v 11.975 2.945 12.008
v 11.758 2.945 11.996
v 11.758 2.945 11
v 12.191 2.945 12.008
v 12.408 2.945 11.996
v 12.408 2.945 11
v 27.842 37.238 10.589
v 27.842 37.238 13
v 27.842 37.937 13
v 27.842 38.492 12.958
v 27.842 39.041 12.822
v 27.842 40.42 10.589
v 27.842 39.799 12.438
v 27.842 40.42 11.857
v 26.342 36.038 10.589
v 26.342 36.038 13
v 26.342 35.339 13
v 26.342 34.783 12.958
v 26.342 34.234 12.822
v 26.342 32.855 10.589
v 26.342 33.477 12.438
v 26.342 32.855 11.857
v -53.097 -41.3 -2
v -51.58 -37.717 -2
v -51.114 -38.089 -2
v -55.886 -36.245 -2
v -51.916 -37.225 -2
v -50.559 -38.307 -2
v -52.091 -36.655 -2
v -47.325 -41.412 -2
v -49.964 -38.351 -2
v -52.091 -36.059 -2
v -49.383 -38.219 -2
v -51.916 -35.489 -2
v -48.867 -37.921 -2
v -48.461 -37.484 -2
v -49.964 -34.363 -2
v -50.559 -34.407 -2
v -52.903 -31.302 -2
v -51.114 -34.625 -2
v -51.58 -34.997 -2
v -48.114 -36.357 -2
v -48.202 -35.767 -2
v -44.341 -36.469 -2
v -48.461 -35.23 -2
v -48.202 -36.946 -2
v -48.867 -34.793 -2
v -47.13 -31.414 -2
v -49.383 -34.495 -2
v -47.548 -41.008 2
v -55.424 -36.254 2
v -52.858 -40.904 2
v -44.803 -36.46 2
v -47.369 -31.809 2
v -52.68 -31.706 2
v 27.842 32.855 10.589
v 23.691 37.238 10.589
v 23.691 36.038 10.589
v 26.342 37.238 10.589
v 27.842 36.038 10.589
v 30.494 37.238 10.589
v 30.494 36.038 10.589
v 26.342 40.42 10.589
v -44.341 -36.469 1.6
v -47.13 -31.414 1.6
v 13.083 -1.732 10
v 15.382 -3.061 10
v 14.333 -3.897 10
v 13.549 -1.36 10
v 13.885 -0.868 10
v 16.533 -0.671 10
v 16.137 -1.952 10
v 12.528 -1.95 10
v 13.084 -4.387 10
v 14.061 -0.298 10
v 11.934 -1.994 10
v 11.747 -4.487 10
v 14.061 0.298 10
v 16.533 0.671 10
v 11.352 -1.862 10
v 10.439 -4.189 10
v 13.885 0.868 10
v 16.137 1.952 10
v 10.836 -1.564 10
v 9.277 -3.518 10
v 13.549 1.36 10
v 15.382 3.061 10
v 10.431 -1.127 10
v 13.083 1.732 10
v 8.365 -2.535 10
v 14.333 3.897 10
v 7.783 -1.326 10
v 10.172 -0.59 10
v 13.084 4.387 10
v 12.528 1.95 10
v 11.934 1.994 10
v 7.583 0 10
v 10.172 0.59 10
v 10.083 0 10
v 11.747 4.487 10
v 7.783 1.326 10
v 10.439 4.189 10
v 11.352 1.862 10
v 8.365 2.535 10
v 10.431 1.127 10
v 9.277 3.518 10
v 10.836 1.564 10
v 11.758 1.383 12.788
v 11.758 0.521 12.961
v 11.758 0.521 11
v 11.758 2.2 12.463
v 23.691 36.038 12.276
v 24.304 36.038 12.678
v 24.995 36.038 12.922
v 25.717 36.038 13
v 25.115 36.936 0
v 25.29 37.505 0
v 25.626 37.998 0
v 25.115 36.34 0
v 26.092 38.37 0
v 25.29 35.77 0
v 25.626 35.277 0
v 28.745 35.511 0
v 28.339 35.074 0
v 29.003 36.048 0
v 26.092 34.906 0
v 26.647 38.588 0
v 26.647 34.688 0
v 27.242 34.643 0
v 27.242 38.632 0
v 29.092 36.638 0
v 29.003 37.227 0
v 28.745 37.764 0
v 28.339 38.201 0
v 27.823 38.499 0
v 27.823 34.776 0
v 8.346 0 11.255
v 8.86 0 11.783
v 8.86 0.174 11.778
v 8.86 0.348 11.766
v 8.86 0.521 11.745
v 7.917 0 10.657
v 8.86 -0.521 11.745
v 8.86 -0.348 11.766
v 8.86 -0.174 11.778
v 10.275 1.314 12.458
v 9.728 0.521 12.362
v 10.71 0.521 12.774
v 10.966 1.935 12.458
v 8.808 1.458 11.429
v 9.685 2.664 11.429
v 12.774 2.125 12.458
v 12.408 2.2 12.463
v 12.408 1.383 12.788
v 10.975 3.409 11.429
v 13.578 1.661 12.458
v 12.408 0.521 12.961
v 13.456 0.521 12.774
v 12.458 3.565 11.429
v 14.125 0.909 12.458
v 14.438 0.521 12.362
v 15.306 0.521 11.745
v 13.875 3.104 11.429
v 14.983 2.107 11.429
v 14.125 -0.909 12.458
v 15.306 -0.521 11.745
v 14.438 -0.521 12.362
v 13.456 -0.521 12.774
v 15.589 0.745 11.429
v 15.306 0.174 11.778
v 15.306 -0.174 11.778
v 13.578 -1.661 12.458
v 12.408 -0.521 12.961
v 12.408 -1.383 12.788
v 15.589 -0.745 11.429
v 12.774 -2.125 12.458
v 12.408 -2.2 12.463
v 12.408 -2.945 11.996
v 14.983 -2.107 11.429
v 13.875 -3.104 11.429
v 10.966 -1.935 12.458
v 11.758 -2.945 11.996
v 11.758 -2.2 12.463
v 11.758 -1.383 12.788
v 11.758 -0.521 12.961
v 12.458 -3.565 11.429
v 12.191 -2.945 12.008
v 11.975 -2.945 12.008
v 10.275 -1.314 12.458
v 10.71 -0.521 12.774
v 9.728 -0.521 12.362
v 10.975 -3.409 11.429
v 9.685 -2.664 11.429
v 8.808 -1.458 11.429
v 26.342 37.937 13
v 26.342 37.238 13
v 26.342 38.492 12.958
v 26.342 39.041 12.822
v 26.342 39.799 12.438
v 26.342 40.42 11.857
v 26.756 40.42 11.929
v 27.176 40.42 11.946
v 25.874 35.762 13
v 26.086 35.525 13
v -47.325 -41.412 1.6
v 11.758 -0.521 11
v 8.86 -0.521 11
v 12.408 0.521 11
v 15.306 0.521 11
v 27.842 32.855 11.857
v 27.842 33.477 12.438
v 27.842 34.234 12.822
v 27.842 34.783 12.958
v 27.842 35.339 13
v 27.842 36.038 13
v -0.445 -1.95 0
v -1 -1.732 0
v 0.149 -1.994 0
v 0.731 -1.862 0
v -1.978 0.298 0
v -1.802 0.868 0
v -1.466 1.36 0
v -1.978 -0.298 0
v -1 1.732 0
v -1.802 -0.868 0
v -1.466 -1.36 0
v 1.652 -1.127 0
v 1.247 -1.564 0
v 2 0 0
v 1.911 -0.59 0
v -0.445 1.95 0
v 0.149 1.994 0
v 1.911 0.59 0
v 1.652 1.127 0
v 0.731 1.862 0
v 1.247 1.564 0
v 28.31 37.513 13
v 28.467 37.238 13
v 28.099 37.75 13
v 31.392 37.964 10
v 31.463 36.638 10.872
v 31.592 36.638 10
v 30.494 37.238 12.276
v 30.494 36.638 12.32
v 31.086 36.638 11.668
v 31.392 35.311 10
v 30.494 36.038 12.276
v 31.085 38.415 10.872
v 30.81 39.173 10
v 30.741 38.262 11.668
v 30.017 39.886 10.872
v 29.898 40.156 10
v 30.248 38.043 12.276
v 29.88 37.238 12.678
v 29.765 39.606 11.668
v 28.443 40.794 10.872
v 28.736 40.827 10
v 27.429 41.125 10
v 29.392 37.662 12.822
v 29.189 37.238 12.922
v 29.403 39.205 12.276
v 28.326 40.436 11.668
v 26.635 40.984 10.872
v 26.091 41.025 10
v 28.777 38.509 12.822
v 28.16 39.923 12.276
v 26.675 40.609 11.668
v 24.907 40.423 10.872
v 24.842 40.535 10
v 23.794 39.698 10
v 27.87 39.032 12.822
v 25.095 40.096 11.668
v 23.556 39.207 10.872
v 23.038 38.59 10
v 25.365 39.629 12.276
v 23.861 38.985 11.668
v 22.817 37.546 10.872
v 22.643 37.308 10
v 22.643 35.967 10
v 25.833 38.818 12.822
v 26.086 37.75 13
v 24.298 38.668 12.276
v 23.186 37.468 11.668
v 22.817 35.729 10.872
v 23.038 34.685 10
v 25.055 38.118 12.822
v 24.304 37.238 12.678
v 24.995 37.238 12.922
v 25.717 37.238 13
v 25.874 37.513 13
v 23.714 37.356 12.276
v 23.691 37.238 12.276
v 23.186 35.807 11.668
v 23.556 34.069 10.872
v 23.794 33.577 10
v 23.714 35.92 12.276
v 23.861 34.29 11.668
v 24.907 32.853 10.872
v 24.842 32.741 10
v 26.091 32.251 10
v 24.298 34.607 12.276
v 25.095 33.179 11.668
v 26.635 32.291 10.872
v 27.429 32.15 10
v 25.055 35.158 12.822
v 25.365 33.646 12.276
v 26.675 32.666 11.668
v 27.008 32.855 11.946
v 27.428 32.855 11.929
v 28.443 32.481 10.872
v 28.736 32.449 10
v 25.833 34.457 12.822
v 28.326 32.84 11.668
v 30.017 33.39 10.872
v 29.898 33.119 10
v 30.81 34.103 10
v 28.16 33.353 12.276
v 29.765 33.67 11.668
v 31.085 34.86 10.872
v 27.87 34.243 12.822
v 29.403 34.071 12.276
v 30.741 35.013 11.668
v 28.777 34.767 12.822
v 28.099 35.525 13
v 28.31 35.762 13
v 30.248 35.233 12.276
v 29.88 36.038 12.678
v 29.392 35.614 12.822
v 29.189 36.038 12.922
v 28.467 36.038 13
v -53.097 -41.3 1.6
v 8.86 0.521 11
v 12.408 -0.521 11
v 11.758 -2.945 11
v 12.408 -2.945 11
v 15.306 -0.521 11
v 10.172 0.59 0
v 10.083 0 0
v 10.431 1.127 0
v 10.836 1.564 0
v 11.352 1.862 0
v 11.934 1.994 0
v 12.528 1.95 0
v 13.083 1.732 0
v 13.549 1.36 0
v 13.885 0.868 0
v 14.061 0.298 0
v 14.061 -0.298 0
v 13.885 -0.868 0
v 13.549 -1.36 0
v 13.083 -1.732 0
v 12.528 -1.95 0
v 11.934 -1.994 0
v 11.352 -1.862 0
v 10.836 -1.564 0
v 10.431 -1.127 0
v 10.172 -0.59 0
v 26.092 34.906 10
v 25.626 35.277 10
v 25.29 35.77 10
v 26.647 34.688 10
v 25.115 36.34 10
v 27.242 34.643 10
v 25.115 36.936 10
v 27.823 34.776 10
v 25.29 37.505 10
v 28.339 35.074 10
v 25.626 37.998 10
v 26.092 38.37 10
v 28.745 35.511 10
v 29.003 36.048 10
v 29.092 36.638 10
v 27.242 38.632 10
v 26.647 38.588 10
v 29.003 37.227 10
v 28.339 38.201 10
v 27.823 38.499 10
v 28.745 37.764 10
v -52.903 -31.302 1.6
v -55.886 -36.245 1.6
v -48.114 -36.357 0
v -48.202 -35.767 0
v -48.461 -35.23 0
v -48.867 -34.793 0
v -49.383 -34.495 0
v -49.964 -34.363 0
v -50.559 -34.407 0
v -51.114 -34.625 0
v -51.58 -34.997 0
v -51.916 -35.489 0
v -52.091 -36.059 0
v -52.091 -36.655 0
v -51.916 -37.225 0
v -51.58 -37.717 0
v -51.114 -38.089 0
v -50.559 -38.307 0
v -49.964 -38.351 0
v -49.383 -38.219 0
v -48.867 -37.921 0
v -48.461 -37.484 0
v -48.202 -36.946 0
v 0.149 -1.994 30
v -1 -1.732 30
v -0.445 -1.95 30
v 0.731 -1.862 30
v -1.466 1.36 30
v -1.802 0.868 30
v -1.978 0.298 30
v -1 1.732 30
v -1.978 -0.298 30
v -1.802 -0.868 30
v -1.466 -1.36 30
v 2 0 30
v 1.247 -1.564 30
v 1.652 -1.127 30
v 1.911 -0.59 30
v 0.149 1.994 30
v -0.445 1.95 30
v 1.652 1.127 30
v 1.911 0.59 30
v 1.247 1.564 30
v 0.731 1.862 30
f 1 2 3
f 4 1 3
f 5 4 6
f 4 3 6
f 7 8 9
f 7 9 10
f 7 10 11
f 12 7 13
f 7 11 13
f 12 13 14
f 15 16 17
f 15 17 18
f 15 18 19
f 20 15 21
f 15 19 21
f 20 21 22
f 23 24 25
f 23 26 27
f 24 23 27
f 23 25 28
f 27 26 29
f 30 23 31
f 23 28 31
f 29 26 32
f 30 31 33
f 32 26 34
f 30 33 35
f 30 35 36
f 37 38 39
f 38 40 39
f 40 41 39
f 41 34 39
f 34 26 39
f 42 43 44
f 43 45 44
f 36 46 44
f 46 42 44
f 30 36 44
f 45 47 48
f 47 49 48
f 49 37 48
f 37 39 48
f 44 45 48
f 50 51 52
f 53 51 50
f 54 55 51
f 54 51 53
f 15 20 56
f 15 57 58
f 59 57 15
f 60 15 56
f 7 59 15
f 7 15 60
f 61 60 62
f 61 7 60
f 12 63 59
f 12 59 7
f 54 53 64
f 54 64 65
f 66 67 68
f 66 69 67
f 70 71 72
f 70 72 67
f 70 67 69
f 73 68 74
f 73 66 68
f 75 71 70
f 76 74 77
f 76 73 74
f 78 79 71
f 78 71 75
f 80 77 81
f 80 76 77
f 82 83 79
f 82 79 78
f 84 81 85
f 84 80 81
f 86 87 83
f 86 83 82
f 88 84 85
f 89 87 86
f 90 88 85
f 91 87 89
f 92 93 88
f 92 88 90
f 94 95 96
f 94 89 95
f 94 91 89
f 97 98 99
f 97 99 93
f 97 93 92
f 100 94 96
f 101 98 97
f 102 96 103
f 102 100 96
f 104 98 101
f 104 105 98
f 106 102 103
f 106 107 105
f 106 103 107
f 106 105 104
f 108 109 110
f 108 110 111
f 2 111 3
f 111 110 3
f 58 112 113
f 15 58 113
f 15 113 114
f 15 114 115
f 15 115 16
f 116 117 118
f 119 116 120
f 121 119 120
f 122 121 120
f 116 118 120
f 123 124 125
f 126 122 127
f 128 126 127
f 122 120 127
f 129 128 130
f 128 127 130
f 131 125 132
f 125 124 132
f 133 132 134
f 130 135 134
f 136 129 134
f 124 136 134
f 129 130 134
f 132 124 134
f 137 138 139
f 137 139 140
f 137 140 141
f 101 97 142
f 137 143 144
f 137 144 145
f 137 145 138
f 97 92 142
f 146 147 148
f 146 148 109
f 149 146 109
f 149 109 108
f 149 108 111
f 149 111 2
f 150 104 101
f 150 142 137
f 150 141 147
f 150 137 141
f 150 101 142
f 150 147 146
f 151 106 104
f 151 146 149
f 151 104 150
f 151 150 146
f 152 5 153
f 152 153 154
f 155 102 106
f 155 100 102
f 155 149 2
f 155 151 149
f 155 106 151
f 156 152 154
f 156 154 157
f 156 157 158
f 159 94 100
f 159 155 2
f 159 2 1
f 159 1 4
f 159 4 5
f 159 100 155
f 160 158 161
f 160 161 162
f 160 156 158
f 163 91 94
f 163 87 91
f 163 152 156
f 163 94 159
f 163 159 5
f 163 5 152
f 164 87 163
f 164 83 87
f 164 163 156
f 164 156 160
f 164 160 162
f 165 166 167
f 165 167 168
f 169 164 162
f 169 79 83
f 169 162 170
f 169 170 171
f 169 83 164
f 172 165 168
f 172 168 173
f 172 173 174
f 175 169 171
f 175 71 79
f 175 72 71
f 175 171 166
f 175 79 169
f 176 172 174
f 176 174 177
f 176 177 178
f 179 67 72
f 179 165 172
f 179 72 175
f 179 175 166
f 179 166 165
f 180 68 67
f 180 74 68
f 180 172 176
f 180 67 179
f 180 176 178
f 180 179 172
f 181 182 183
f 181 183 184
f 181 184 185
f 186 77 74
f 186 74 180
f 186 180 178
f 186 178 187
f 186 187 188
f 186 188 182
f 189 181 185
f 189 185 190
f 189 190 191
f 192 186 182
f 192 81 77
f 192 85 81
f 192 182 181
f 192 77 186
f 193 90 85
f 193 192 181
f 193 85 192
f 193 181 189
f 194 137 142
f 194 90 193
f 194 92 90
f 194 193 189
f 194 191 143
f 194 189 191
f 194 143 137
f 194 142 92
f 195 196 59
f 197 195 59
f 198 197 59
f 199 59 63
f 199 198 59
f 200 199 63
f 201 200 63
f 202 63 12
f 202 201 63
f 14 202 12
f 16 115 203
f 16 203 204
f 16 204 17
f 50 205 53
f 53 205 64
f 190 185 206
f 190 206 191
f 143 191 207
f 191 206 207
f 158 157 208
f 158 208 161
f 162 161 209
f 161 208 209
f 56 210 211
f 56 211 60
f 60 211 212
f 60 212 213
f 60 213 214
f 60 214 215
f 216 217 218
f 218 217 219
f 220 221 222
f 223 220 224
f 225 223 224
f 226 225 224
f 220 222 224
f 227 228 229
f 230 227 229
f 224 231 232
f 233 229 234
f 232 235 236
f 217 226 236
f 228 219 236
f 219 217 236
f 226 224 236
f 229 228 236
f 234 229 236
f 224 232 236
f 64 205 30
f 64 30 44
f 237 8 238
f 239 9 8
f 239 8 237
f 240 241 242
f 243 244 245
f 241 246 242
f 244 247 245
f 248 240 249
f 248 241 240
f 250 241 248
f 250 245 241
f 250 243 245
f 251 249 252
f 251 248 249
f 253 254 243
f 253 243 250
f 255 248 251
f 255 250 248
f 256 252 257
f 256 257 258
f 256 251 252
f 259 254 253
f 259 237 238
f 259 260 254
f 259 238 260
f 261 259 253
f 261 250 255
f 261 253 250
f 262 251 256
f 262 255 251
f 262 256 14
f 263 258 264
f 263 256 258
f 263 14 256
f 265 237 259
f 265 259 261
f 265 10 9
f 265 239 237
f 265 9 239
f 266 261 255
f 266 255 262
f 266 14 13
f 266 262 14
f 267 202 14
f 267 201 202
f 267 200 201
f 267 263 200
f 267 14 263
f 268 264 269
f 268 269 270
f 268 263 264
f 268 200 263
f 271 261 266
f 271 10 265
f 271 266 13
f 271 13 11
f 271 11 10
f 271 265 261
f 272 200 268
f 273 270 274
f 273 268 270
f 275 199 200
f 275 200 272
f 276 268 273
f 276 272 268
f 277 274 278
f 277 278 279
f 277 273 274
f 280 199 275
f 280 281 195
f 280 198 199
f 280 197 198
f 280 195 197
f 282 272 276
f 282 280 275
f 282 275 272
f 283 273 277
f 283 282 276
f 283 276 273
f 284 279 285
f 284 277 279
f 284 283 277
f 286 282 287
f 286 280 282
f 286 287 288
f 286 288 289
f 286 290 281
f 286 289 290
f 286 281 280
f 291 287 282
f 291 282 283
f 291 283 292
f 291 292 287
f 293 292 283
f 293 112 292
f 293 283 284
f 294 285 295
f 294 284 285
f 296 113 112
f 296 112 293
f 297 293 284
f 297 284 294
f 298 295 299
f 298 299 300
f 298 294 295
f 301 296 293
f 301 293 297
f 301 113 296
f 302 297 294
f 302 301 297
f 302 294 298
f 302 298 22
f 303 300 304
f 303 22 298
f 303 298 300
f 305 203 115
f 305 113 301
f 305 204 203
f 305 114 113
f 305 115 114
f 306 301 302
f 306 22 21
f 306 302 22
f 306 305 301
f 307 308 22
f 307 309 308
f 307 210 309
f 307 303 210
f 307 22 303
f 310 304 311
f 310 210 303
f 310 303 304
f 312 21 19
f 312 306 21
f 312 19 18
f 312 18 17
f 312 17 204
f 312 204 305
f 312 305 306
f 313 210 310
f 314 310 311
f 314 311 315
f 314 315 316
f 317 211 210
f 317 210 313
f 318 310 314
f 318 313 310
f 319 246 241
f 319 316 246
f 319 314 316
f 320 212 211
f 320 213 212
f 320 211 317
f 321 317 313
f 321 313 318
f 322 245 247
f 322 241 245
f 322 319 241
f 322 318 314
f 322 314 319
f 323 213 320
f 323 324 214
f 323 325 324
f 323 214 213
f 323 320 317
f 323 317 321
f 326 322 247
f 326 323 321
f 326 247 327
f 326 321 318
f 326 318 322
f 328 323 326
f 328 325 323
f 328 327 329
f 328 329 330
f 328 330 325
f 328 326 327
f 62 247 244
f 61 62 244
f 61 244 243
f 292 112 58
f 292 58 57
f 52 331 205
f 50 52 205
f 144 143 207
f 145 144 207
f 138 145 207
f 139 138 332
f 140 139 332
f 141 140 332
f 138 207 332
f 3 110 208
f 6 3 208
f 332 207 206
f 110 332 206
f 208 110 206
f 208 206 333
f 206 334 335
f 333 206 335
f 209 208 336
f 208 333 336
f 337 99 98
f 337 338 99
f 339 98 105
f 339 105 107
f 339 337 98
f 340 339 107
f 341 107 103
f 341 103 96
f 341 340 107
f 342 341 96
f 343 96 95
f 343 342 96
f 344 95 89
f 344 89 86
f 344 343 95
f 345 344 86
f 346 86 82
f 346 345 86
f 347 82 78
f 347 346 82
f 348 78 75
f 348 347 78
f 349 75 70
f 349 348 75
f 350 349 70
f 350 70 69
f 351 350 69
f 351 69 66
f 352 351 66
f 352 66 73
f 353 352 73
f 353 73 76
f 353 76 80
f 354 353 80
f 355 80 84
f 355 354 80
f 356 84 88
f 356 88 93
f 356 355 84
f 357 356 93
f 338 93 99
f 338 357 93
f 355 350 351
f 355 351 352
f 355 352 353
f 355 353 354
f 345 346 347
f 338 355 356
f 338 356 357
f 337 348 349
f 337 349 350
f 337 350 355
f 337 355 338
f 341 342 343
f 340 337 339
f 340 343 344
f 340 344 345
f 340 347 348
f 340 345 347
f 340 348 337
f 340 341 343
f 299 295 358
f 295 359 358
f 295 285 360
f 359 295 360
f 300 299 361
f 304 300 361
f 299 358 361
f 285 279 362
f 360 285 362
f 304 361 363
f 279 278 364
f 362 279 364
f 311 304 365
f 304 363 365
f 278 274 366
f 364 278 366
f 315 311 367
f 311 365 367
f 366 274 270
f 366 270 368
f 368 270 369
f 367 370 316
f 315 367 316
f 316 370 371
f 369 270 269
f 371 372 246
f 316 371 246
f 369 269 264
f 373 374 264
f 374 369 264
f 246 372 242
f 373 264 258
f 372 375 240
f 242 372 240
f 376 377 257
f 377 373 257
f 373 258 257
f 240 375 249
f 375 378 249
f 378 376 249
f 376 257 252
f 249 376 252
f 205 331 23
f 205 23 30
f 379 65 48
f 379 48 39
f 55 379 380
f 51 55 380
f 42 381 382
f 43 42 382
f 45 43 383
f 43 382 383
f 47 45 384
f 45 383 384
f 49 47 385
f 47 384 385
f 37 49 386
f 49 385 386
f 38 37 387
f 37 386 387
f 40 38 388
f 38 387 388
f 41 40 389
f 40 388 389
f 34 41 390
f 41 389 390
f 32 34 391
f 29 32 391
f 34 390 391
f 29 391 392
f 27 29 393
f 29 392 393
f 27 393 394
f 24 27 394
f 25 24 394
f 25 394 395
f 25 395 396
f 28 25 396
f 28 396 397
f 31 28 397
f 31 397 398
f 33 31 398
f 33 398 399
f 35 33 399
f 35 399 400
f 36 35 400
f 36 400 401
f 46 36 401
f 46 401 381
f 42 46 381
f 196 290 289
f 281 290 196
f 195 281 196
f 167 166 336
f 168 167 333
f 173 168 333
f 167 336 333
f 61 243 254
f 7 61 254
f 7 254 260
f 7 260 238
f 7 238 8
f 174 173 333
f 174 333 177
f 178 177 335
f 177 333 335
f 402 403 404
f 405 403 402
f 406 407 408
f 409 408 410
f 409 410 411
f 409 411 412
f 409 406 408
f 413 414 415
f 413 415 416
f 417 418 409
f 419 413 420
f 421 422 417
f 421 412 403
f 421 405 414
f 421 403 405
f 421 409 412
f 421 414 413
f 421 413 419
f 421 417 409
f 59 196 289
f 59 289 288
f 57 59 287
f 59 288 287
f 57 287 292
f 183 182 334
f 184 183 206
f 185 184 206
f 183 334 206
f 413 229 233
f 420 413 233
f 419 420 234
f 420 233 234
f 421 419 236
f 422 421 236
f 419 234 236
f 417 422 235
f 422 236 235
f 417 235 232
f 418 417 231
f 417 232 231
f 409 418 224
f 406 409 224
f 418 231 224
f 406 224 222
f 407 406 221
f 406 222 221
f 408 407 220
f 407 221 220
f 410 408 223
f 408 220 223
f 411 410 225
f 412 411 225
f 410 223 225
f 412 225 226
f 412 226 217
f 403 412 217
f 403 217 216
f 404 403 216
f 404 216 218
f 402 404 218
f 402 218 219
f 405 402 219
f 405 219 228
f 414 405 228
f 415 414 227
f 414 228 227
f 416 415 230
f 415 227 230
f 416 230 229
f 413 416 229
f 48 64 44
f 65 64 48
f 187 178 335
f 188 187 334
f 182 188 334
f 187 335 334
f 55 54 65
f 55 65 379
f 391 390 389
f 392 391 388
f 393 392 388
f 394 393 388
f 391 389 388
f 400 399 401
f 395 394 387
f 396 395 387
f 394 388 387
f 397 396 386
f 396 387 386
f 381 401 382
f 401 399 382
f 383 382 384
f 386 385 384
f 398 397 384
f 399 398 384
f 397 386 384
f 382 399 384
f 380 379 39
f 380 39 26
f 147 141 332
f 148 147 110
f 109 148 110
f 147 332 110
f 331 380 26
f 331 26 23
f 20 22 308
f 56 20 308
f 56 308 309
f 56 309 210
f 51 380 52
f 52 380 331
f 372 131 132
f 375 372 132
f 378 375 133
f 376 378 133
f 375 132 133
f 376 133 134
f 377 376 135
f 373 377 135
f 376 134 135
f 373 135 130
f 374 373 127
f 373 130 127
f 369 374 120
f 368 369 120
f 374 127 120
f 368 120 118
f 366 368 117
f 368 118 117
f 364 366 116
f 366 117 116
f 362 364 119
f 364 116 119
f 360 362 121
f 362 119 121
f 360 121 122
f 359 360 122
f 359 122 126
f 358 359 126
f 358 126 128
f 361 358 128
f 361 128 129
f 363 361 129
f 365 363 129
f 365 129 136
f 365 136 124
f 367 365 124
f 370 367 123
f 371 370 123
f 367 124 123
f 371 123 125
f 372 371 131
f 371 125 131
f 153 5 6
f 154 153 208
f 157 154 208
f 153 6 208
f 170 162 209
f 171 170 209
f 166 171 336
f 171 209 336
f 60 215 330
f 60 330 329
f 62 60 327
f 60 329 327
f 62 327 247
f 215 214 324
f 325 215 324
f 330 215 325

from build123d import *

# Parameters (mm, degrees)
F0_R      = 2
F1_DEPTH  = 30
F3_DEPTH  = 2
F6_R      = 2
F7_DEPTH  = 25
F8_R      = 2
F9_DEPTH  = 10
F10_R     = 4.5
F11_DEPTH = 3
F12_R     = 2.99999
F13_W     = 1.5
F13_H     = 3.1823935074
F13_H_2   = 1.2
F13_W_2   = 2.6515979143
F14_DEPTH = 2.41106
F15_SIZE  = 0.4
F19_START = -1
F19_DEPTH = 19.001


# Not quite as in the source:
# - a fillet or chamfer is up to 0.001 mm smaller than in the source, because OpenCascade refuses the exact size
# - the program builds the solid bodies; features that only make, move or delete a surface that nothing else refers to are left out


with BuildPart() as f1:
    # F0 (on Top) → F1 (new body)
    with BuildSketch(Plane.XY):
        Circle(F0_R)
    extrude(amount=F1_DEPTH)


with BuildPart() as f3:
    # F2 (on Top) → F3 (new body, symmetric)
    with BuildSketch(Plane.XY):
        Polygon((-44.3412244239, -36.4691410829), (-47.1302721521, -31.4139906298), (-52.9026847286, -31.3018015883), (-55.8860495767, -36.2447629999), (-53.0970018485, -41.2999134529), (-47.3245892721, -41.4121024944), align=None)
    extrude(amount=F3_DEPTH, both=True)

    # F6 (on face) → F7 (cut)
    with BuildSketch(Plane.XY):
        with Locations((-50.1136370003, -36.3569520414)):
            Circle(F6_R)
    extrude(amount=-F7_DEPTH, mode=Mode.SUBTRACT)

    # F15
    f15_edges = [f3.edges().sort_by_distance(p)[0] for p in [
        (-54.394367, -33.773282, 2),
        (-50.016478, -31.357896, 2),
        (-45.735748, -33.941566, 2),
        (-54.491526, -38.772338, 2),
        (-50.210796, -41.356008, 2),
        (-45.832907, -38.940622, 2),
    ]]
    chamfer(f15_edges, length=F15_SIZE)


with BuildPart() as f9:
    # F8 (on Top) → F9 (new body)
    with BuildSketch(Plane.XY):
        with Locations((27.0922463387, 36.6377010942)):
            Circle(F8_R)
    extrude(amount=F9_DEPTH)

    # F10 (on face) → F11 (join)
    with BuildSketch(Plane.XY.offset(10)):
        with Locations((27.0922463387, 36.6377010942)):
            Circle(F10_R)
    extrude(amount=F11_DEPTH)

    # F12 (radius 3 in the source; OpenCascade refuses exactly that, so slightly less here)
    f12_edges = [f9.edges().sort_by_distance(p)[0] for p in [
        (22.592246, 36.637701, 13),
    ]]
    fillet(f12_edges, radius=F12_R)

    # F13 (on face) → F14 (cut)
    with BuildSketch(Plane.XY.offset(13)):
        with Locations((27.0922463387, 34.4465043404)):
            Rectangle(F13_W, F13_H)
        with Locations((27.0922463387, 36.6377010942)):
            Rectangle(F13_W, F13_H_2)
        with Locations((29.1680452959, 36.6377010942)):
            Rectangle(F13_W_2, F13_H_2)
        with Locations((25.0164473816, 36.6377010942)):
            Rectangle(F13_W_2, F13_H_2)
        with Locations((27.0922463387, 38.8288978479)):
            Rectangle(F13_W, F13_H)
    extrude(amount=-F14_DEPTH, mode=Mode.SUBTRACT)


with BuildPart() as f17:
    # F16 (on Front) → F17 (revolve)
    with BuildSketch(Plane.XZ):
        with BuildLine():
            Line((10.083048013, 0), (12.083048013, 0))
            Line((12.083048013, 0), (12.083048013, 13))
            ThreePointArc((12.083048013, 13), (9.3788845564, 12.1812451849), (7.583048013, 10))
            Line((7.583048013, 10), (10.083048013, 10))
            Line((10.083048013, 10), (10.083048013, 0))
        make_face()
    revolve(axis=Axis((12.083048013, 0, 5.7094343938), (0, 0, -1)))

    # F18 (on face) → F19 (cut)
    with BuildSketch(Plane(origin=(0, 0, 10), x_dir=(1, 0, 0), z_dir=(0, 0, -1)).offset(F19_START)):
        with BuildLine():
            Line((12.4078653753, 1.9734471569), (12.4078653753, 2.9453942552))
            Line((12.4078653753, 2.9453942552), (11.7582306508, 2.9453942552))
            Line((11.7582306508, 2.9453942552), (11.7582306508, 1.9734471569))
            ThreePointArc((11.7582306508, 1.9734471569), (12.083048013, 2), (12.4078653753, 1.9734471569))
        make_face()
        with BuildLine():
            ThreePointArc((12.4078653753, -1.9734471569), (12.083048013, -2), (11.7582306508, -1.9734471569))
            Line((11.7582306508, -1.9734471569), (11.7582306508, -2.9453942552))
            Line((11.7582306508, -2.9453942552), (12.4078653753, -2.9453942552))
            Line((12.4078653753, -2.9453942552), (12.4078653753, -1.9734471569))
        make_face()
        with BuildLine():
            Line((15.3060089797, 0.5210122326), (14.0139924072, 0.5210122326))
            ThreePointArc((14.0139924072, 0.5210122326), (14.0657089508, 0.2627843333), (14.083048013, 0))
            ThreePointArc((14.083048013, 0), (14.0657089508, -0.2627843333), (14.0139924072, -0.5210122326))
            Line((14.0139924072, -0.5210122326), (15.3060089797, -0.5210122326))
            Line((15.3060089797, -0.5210122326), (15.3060089797, 0.5210122326))
        make_face()
        with BuildLine():
            ThreePointArc((10.1521036188, -0.5210122326), (10.083048013, 0), (10.1521036188, 0.5210122326))
            Line((10.1521036188, 0.5210122326), (8.8600870464, 0.5210122326))
            Line((8.8600870464, 0.5210122326), (8.8600870464, -0.5210122326))
            Line((8.8600870464, -0.5210122326), (10.1521036188, -0.5210122326))
        make_face()
        with BuildLine():
            Line((12.4078653753, 0.5210122326), (12.4078653753, 1.9734471569))
            ThreePointArc((12.4078653753, 1.9734471569), (12.083048013, 2), (11.7582306508, 1.9734471569))
            Line((11.7582306508, 1.9734471569), (11.7582306508, 0.5210122326))
            Line((11.7582306508, 0.5210122326), (10.1521036188, 0.5210122326))
            ThreePointArc((10.1521036188, 0.5210122326), (10.083048013, 0), (10.1521036188, -0.5210122326))
            Line((10.1521036188, -0.5210122326), (11.7582306508, -0.5210122326))
            Line((11.7582306508, -0.5210122326), (11.7582306508, -1.9734471569))
            ThreePointArc((11.7582306508, -1.9734471569), (12.083048013, -2), (12.4078653753, -1.9734471569))
            Line((12.4078653753, -1.9734471569), (12.4078653753, -0.5210122326))
            Line((12.4078653753, -0.5210122326), (14.0139924072, -0.5210122326))
            ThreePointArc((14.0139924072, -0.5210122326), (14.0657089508, -0.2627843333), (14.083048013, 0))
            ThreePointArc((14.083048013, 0), (14.0657089508, 0.2627843333), (14.0139924072, 0.5210122326))
            Line((14.0139924072, 0.5210122326), (12.4078653753, 0.5210122326))
        make_face()
    extrude(amount=-F19_DEPTH, mode=Mode.SUBTRACT)


solid = Compound([f1.part, f3.part, f9.part, f17.part])
